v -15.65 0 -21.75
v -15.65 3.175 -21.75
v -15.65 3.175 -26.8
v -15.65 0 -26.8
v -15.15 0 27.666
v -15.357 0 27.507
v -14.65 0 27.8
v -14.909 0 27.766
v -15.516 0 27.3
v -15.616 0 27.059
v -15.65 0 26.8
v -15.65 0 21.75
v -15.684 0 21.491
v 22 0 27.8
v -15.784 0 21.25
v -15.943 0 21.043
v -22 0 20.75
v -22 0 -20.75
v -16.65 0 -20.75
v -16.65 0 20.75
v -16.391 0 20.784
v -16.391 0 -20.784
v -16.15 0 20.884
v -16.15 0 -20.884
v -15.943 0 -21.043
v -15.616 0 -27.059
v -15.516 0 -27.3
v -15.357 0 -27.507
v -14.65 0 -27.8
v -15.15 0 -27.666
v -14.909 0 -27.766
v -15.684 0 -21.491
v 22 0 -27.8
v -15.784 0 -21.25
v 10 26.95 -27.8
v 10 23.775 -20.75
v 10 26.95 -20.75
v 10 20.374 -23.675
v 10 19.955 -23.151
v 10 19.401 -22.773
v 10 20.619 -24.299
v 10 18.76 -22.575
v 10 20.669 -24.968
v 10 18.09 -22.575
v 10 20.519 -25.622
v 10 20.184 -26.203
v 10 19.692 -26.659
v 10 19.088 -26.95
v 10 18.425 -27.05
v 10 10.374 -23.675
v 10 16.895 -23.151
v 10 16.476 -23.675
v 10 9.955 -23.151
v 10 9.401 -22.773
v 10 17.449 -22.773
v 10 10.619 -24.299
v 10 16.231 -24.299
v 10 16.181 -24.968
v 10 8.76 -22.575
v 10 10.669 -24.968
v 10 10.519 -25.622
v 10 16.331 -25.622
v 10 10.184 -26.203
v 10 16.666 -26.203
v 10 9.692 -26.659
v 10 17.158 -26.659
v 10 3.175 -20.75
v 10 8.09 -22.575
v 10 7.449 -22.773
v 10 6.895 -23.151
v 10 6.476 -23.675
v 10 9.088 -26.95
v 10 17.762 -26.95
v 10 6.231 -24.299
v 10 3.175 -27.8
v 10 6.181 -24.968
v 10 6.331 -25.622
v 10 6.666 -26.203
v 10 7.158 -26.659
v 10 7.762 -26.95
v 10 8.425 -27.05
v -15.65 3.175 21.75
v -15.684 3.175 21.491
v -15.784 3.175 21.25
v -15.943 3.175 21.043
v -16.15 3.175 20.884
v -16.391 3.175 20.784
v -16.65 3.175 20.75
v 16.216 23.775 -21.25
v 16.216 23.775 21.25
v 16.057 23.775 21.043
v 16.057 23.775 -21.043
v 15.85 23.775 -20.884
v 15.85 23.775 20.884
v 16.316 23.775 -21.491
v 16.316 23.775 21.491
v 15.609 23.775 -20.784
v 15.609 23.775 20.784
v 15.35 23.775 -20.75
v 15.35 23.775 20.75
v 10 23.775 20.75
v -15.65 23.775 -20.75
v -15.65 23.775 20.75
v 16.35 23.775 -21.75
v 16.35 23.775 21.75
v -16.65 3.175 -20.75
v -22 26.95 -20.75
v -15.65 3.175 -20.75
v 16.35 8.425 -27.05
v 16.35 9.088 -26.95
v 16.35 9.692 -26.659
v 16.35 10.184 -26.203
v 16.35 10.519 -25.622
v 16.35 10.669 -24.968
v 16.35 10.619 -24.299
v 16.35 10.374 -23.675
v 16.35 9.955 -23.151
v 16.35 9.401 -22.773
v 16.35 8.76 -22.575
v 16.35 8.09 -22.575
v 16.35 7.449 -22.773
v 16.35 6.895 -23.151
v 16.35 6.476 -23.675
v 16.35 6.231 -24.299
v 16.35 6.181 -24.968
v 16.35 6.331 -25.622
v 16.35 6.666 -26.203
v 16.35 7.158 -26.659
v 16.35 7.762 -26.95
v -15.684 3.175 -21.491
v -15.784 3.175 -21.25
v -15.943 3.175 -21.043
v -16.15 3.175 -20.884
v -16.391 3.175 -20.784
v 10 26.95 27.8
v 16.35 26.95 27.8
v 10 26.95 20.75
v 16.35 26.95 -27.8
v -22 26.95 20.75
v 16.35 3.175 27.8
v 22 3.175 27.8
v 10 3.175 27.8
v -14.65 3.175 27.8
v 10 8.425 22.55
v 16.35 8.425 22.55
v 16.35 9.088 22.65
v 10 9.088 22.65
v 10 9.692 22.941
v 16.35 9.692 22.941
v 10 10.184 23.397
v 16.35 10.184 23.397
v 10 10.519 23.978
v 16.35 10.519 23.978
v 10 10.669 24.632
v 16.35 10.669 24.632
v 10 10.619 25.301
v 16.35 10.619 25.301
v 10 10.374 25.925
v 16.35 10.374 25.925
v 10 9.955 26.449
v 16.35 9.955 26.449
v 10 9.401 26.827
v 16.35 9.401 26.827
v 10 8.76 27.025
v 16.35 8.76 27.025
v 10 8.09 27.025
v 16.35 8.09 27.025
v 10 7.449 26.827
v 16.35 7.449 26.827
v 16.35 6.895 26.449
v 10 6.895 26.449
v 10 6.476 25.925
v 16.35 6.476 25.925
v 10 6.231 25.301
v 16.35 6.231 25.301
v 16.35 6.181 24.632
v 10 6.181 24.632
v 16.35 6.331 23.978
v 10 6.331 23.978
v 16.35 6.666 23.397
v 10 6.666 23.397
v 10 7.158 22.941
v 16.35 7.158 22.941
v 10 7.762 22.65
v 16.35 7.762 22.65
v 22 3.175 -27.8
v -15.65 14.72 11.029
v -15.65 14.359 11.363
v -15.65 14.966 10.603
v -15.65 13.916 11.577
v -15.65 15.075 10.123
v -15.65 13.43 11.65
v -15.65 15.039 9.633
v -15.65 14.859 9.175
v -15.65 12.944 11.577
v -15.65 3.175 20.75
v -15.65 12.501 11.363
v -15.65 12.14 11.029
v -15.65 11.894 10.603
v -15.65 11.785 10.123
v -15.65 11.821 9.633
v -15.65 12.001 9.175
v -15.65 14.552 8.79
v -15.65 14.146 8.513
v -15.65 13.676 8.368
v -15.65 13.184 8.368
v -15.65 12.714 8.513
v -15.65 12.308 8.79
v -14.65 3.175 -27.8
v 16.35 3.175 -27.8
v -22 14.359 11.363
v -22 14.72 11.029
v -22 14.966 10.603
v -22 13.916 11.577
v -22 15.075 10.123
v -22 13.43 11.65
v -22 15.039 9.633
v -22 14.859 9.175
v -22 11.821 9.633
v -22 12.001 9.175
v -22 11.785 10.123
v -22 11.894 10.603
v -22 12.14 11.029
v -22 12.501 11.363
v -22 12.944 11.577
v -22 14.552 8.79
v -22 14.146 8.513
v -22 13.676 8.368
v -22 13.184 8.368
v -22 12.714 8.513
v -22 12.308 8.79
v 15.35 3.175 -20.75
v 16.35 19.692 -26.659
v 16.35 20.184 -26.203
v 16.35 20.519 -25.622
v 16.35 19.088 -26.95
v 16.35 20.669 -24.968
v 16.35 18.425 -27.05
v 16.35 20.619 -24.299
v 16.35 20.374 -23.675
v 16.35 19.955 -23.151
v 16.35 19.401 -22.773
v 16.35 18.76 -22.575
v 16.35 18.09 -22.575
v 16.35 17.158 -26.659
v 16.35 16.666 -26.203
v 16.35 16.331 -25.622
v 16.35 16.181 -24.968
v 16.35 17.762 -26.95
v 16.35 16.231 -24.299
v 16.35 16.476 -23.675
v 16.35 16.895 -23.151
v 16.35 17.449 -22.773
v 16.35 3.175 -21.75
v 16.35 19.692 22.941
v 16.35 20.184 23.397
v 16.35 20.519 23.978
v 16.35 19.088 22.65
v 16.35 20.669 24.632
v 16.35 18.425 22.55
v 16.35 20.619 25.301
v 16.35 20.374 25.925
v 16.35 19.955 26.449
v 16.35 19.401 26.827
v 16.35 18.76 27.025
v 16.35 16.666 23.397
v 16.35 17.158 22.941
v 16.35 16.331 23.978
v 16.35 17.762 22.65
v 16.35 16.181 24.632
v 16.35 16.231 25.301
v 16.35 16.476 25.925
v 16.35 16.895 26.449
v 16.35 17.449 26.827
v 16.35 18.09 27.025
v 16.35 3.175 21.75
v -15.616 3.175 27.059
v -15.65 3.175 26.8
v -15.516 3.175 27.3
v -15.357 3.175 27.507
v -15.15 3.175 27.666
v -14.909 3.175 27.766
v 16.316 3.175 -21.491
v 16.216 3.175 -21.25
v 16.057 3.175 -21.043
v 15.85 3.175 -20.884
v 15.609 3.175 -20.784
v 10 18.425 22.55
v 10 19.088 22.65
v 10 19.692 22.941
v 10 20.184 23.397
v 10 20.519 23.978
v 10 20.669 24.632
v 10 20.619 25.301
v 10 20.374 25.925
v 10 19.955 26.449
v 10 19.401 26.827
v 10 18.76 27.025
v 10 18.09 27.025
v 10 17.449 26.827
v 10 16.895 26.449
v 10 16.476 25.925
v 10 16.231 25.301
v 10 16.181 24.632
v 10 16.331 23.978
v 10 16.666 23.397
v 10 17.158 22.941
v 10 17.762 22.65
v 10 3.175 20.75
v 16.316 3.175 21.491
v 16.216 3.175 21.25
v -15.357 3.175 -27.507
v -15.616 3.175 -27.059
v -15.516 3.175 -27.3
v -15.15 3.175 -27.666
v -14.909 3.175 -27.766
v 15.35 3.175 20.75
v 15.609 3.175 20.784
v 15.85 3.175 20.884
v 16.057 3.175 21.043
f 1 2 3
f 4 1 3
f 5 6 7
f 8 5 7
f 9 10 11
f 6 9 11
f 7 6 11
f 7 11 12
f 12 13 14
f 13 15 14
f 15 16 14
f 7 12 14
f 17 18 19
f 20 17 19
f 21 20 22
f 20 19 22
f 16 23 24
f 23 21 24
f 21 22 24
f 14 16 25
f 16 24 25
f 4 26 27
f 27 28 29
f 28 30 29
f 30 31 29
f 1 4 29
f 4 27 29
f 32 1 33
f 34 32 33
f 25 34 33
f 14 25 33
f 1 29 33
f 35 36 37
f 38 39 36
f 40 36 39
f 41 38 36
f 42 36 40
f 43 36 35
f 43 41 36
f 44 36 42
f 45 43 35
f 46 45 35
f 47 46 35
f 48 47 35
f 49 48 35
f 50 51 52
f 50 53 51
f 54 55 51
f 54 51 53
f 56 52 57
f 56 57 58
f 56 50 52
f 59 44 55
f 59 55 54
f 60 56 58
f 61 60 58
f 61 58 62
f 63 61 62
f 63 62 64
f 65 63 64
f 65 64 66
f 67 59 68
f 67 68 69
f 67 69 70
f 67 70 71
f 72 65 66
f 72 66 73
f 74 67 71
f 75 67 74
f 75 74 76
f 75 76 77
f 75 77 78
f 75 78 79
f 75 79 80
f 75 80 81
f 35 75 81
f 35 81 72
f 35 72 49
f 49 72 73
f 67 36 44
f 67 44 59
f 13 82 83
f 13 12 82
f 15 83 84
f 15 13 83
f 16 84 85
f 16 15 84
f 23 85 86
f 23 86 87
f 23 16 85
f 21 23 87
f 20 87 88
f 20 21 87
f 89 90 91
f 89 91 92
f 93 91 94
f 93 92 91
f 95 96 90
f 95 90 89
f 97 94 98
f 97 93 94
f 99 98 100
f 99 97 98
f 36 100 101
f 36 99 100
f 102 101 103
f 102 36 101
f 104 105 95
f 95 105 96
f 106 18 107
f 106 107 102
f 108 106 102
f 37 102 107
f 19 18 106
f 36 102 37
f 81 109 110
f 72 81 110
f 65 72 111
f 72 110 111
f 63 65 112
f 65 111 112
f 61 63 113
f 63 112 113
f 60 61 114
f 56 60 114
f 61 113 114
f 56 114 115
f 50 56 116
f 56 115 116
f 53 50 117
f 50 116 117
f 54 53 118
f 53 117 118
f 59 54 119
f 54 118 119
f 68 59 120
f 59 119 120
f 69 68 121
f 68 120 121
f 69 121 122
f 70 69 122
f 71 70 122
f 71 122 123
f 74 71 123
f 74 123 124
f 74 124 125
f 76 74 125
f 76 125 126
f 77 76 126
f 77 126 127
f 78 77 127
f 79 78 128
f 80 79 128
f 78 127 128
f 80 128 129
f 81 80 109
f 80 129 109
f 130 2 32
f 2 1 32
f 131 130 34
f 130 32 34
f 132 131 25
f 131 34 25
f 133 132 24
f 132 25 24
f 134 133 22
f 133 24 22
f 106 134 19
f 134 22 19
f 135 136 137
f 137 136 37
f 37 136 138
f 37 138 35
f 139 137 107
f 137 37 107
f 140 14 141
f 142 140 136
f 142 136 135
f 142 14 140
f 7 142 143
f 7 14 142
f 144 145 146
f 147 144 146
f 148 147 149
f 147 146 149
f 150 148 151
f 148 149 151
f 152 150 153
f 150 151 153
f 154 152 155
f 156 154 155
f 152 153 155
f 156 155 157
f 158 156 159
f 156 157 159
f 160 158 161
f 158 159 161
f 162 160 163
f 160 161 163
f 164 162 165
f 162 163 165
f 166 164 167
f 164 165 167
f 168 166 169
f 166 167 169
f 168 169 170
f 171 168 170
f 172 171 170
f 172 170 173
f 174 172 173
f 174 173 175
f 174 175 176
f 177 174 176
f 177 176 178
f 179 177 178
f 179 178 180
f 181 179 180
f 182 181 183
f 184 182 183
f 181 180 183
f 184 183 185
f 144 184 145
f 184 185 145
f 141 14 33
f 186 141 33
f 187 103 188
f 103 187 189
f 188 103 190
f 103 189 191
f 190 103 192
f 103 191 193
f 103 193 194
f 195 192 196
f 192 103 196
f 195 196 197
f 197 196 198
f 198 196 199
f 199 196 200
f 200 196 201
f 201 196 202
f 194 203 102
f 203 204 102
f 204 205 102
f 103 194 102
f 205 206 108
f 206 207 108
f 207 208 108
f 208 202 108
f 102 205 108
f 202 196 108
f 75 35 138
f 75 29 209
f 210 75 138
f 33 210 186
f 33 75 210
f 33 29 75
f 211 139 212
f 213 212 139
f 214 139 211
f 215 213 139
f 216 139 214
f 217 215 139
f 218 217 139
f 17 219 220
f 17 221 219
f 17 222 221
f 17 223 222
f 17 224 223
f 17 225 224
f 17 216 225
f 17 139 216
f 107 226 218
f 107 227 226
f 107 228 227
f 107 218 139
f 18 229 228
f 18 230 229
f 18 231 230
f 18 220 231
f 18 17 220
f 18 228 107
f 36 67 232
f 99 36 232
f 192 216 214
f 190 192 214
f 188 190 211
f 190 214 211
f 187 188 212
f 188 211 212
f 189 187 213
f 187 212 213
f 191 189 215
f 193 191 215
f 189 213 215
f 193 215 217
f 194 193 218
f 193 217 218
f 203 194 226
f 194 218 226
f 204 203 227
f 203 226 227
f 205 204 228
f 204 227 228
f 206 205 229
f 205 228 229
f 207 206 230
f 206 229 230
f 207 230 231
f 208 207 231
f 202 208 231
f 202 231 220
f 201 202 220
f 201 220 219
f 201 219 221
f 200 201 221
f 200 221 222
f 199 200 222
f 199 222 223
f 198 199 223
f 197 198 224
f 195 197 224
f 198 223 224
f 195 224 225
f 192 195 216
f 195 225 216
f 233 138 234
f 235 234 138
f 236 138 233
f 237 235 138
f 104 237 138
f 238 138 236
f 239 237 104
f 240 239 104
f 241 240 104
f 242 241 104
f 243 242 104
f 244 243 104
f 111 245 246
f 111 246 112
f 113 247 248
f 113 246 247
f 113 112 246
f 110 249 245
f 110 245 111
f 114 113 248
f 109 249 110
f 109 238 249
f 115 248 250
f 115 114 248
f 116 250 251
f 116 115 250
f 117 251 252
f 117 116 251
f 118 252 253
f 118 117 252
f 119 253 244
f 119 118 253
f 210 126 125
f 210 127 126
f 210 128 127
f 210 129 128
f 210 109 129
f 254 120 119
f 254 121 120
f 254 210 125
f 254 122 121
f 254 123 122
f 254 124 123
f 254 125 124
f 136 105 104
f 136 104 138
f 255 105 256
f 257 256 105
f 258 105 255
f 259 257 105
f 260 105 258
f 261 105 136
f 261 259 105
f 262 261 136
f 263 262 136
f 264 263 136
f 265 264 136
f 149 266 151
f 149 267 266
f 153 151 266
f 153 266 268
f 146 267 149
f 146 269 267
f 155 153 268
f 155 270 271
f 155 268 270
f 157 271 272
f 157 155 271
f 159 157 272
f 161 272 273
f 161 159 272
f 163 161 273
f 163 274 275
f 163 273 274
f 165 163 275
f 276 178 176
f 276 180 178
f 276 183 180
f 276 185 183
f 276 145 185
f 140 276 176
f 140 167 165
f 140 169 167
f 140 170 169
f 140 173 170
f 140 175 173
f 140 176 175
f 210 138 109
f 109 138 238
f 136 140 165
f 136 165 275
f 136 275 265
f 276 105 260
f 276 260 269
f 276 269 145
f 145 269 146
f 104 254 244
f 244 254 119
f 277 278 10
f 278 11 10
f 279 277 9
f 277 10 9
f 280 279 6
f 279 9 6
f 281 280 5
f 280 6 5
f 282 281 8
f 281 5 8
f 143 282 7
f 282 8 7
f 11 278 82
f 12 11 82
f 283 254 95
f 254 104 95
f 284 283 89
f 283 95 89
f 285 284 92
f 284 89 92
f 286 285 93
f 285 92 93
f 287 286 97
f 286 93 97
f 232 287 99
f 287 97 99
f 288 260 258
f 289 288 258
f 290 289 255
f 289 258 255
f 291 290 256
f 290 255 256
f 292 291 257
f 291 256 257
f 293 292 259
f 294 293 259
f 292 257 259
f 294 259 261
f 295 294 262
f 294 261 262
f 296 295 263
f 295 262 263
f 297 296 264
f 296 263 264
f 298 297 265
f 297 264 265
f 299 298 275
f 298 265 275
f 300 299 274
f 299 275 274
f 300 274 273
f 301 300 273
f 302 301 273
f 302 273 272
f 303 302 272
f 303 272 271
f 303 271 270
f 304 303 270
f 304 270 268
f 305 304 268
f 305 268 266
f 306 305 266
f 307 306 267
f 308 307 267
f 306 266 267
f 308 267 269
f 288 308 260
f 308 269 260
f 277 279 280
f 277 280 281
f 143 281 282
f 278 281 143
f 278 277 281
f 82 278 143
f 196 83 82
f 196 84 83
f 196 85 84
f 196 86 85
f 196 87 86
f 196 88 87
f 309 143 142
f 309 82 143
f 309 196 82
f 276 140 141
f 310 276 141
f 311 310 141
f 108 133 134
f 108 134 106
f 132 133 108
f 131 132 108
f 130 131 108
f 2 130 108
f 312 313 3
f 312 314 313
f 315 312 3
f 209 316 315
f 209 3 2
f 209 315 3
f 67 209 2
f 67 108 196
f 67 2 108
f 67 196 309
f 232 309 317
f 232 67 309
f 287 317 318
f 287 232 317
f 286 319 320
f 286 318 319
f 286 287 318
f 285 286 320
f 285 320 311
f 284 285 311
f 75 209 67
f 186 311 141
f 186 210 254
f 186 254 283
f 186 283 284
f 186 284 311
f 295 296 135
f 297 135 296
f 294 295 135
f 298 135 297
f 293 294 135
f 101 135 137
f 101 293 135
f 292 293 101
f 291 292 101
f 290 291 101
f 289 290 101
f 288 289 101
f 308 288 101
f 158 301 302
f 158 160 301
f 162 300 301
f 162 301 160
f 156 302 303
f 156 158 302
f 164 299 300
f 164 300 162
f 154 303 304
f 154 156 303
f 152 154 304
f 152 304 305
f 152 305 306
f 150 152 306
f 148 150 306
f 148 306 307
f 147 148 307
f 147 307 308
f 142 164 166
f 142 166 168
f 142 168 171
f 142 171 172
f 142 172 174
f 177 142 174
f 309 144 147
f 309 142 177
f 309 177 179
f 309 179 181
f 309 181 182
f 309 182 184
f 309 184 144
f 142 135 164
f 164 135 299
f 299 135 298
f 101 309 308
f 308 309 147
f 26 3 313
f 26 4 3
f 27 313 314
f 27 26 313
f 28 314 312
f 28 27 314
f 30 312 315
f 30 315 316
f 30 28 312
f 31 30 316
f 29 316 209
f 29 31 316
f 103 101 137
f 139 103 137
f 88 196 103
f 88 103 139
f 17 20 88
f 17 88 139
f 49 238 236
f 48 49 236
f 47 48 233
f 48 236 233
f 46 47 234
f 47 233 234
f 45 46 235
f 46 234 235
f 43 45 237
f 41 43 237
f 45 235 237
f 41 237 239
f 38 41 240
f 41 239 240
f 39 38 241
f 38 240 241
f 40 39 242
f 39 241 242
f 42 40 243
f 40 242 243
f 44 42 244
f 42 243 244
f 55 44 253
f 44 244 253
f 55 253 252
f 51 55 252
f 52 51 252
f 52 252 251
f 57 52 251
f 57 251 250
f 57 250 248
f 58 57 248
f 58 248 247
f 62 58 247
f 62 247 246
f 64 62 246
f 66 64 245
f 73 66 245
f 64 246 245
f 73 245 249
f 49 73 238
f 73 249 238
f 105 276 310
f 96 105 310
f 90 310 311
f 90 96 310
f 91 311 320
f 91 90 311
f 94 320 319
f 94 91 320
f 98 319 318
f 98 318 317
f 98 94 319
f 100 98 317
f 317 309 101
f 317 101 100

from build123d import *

# Parameters (mm, degrees)
SKETCH1_W           = 44
SKETCH1_H           = 55.6
BOSS_EXTRUDE1_DEPTH = 3.175
SKETCH2_W           = 6.35
SKETCH2_H           = 41.5
SKETCH2_H_2         = 7.05
BOSS_EXTRUDE2_DEPTH = 20.6
BOSS_EXTRUDE3_DEPTH = 3.175
SKETCH5_R           = 2.25
CUT_EXTRUDE2_DEPTH  = 6.35
SKETCH6_R           = 1.65
CUT_EXTRUDE3_DEPTH  = 6.35
FILLET1_R           = 1
SKETCH7_W           = 6.35
SKETCH7_H           = 7.05
CUT_EXTRUDE4_DEPTH  = 3.175
FILLET2_R           = 1


with BuildPart() as part:
    # Sketch1 → Boss-Extrude1 (new body)
    with BuildSketch(Plane(origin=(0, 0, 0), x_dir=(1, 0, 0), z_dir=(0, 1, 0))):
        Rectangle(SKETCH1_W, SKETCH1_H)
    extrude(amount=BOSS_EXTRUDE1_DEPTH)

    # Sketch2 → Boss-Extrude2 (add)
    with BuildSketch(Plane(origin=(0, 3.175, 0), x_dir=(1, 0, 0), z_dir=(0, 1, 0))):
        with Locations((-18.825, 0)):
            Rectangle(SKETCH2_W, SKETCH2_H)
        with Locations((13.175, 24.275)):
            Rectangle(SKETCH2_W, SKETCH2_H_2)
        with Locations((13.175, -24.275)):
            Rectangle(SKETCH2_W, SKETCH2_H_2)
    extrude(amount=BOSS_EXTRUDE2_DEPTH)

    # Sketch3 → Boss-Extrude3 (add)
    with BuildSketch(Plane(origin=(0, 23.775, 0), x_dir=(1, 0, 0), z_dir=(0, 1, 0))):
        Polygon((-22, 20.75), (10, 20.75), (10, 27.8), (16.35, 27.8), (16.35, -27.8), (10, -27.8), (10, -20.75), (-22, -20.75), align=None)
    extrude(amount=BOSS_EXTRUDE3_DEPTH)

    # Sketch5 → Cut-Extrude2 (cut)
    with BuildSketch(Plane(origin=(16.35, 0, 0), x_dir=(0, 0, -1), z_dir=(1, 0, 0))):
        with Locations((-24.8, 8.425)):
            Circle(SKETCH5_R)
        with Locations((-24.8, 18.425)):
            Circle(SKETCH5_R)
        with Locations((24.8, 18.425)):
            Circle(SKETCH5_R)
        with Locations((24.8, 8.425)):
            Circle(SKETCH5_R)
    extrude(amount=-CUT_EXTRUDE2_DEPTH, mode=Mode.SUBTRACT)

    # Sketch6 → Cut-Extrude3 (cut)
    with BuildSketch(Plane.ZY.offset(22)):
        with Locations((10, 13.43)):
            Circle(SKETCH6_R)
    extrude(amount=-CUT_EXTRUDE3_DEPTH, mode=Mode.SUBTRACT)

    # Fillet1
    fillet1_edges = [part.edges().sort_by_distance(p)[0] for p in [
        (16.35, 13.475, 20.75),
        (16.35, 13.475, -20.75),
    ]]
    fillet(fillet1_edges, radius=FILLET1_R)

    # Sketch7 → Cut-Extrude4 (cut)
    with BuildSketch(Plane(origin=(0, 3.175, 0), x_dir=(1, 0, 0), z_dir=(0, 1, 0))):
        with Locations((-18.825, -24.275)):
            Rectangle(SKETCH7_W, SKETCH7_H)
        with Locations((-18.825, 24.275)):
            Rectangle(SKETCH7_W, SKETCH7_H)
    extrude(amount=-CUT_EXTRUDE4_DEPTH, mode=Mode.SUBTRACT)

    # Fillet2
    fillet2_edges = [part.edges().sort_by_distance(p)[0] for p in [
        (-15.65, 1.5875, 20.75),
        (-15.65, 1.5875, 27.8),
        (-15.65, 1.5875, -27.8),
        (-15.65, 1.5875, -20.75),
    ]]
    fillet(fillet2_edges, radius=FILLET2_R)


solid = part.part
